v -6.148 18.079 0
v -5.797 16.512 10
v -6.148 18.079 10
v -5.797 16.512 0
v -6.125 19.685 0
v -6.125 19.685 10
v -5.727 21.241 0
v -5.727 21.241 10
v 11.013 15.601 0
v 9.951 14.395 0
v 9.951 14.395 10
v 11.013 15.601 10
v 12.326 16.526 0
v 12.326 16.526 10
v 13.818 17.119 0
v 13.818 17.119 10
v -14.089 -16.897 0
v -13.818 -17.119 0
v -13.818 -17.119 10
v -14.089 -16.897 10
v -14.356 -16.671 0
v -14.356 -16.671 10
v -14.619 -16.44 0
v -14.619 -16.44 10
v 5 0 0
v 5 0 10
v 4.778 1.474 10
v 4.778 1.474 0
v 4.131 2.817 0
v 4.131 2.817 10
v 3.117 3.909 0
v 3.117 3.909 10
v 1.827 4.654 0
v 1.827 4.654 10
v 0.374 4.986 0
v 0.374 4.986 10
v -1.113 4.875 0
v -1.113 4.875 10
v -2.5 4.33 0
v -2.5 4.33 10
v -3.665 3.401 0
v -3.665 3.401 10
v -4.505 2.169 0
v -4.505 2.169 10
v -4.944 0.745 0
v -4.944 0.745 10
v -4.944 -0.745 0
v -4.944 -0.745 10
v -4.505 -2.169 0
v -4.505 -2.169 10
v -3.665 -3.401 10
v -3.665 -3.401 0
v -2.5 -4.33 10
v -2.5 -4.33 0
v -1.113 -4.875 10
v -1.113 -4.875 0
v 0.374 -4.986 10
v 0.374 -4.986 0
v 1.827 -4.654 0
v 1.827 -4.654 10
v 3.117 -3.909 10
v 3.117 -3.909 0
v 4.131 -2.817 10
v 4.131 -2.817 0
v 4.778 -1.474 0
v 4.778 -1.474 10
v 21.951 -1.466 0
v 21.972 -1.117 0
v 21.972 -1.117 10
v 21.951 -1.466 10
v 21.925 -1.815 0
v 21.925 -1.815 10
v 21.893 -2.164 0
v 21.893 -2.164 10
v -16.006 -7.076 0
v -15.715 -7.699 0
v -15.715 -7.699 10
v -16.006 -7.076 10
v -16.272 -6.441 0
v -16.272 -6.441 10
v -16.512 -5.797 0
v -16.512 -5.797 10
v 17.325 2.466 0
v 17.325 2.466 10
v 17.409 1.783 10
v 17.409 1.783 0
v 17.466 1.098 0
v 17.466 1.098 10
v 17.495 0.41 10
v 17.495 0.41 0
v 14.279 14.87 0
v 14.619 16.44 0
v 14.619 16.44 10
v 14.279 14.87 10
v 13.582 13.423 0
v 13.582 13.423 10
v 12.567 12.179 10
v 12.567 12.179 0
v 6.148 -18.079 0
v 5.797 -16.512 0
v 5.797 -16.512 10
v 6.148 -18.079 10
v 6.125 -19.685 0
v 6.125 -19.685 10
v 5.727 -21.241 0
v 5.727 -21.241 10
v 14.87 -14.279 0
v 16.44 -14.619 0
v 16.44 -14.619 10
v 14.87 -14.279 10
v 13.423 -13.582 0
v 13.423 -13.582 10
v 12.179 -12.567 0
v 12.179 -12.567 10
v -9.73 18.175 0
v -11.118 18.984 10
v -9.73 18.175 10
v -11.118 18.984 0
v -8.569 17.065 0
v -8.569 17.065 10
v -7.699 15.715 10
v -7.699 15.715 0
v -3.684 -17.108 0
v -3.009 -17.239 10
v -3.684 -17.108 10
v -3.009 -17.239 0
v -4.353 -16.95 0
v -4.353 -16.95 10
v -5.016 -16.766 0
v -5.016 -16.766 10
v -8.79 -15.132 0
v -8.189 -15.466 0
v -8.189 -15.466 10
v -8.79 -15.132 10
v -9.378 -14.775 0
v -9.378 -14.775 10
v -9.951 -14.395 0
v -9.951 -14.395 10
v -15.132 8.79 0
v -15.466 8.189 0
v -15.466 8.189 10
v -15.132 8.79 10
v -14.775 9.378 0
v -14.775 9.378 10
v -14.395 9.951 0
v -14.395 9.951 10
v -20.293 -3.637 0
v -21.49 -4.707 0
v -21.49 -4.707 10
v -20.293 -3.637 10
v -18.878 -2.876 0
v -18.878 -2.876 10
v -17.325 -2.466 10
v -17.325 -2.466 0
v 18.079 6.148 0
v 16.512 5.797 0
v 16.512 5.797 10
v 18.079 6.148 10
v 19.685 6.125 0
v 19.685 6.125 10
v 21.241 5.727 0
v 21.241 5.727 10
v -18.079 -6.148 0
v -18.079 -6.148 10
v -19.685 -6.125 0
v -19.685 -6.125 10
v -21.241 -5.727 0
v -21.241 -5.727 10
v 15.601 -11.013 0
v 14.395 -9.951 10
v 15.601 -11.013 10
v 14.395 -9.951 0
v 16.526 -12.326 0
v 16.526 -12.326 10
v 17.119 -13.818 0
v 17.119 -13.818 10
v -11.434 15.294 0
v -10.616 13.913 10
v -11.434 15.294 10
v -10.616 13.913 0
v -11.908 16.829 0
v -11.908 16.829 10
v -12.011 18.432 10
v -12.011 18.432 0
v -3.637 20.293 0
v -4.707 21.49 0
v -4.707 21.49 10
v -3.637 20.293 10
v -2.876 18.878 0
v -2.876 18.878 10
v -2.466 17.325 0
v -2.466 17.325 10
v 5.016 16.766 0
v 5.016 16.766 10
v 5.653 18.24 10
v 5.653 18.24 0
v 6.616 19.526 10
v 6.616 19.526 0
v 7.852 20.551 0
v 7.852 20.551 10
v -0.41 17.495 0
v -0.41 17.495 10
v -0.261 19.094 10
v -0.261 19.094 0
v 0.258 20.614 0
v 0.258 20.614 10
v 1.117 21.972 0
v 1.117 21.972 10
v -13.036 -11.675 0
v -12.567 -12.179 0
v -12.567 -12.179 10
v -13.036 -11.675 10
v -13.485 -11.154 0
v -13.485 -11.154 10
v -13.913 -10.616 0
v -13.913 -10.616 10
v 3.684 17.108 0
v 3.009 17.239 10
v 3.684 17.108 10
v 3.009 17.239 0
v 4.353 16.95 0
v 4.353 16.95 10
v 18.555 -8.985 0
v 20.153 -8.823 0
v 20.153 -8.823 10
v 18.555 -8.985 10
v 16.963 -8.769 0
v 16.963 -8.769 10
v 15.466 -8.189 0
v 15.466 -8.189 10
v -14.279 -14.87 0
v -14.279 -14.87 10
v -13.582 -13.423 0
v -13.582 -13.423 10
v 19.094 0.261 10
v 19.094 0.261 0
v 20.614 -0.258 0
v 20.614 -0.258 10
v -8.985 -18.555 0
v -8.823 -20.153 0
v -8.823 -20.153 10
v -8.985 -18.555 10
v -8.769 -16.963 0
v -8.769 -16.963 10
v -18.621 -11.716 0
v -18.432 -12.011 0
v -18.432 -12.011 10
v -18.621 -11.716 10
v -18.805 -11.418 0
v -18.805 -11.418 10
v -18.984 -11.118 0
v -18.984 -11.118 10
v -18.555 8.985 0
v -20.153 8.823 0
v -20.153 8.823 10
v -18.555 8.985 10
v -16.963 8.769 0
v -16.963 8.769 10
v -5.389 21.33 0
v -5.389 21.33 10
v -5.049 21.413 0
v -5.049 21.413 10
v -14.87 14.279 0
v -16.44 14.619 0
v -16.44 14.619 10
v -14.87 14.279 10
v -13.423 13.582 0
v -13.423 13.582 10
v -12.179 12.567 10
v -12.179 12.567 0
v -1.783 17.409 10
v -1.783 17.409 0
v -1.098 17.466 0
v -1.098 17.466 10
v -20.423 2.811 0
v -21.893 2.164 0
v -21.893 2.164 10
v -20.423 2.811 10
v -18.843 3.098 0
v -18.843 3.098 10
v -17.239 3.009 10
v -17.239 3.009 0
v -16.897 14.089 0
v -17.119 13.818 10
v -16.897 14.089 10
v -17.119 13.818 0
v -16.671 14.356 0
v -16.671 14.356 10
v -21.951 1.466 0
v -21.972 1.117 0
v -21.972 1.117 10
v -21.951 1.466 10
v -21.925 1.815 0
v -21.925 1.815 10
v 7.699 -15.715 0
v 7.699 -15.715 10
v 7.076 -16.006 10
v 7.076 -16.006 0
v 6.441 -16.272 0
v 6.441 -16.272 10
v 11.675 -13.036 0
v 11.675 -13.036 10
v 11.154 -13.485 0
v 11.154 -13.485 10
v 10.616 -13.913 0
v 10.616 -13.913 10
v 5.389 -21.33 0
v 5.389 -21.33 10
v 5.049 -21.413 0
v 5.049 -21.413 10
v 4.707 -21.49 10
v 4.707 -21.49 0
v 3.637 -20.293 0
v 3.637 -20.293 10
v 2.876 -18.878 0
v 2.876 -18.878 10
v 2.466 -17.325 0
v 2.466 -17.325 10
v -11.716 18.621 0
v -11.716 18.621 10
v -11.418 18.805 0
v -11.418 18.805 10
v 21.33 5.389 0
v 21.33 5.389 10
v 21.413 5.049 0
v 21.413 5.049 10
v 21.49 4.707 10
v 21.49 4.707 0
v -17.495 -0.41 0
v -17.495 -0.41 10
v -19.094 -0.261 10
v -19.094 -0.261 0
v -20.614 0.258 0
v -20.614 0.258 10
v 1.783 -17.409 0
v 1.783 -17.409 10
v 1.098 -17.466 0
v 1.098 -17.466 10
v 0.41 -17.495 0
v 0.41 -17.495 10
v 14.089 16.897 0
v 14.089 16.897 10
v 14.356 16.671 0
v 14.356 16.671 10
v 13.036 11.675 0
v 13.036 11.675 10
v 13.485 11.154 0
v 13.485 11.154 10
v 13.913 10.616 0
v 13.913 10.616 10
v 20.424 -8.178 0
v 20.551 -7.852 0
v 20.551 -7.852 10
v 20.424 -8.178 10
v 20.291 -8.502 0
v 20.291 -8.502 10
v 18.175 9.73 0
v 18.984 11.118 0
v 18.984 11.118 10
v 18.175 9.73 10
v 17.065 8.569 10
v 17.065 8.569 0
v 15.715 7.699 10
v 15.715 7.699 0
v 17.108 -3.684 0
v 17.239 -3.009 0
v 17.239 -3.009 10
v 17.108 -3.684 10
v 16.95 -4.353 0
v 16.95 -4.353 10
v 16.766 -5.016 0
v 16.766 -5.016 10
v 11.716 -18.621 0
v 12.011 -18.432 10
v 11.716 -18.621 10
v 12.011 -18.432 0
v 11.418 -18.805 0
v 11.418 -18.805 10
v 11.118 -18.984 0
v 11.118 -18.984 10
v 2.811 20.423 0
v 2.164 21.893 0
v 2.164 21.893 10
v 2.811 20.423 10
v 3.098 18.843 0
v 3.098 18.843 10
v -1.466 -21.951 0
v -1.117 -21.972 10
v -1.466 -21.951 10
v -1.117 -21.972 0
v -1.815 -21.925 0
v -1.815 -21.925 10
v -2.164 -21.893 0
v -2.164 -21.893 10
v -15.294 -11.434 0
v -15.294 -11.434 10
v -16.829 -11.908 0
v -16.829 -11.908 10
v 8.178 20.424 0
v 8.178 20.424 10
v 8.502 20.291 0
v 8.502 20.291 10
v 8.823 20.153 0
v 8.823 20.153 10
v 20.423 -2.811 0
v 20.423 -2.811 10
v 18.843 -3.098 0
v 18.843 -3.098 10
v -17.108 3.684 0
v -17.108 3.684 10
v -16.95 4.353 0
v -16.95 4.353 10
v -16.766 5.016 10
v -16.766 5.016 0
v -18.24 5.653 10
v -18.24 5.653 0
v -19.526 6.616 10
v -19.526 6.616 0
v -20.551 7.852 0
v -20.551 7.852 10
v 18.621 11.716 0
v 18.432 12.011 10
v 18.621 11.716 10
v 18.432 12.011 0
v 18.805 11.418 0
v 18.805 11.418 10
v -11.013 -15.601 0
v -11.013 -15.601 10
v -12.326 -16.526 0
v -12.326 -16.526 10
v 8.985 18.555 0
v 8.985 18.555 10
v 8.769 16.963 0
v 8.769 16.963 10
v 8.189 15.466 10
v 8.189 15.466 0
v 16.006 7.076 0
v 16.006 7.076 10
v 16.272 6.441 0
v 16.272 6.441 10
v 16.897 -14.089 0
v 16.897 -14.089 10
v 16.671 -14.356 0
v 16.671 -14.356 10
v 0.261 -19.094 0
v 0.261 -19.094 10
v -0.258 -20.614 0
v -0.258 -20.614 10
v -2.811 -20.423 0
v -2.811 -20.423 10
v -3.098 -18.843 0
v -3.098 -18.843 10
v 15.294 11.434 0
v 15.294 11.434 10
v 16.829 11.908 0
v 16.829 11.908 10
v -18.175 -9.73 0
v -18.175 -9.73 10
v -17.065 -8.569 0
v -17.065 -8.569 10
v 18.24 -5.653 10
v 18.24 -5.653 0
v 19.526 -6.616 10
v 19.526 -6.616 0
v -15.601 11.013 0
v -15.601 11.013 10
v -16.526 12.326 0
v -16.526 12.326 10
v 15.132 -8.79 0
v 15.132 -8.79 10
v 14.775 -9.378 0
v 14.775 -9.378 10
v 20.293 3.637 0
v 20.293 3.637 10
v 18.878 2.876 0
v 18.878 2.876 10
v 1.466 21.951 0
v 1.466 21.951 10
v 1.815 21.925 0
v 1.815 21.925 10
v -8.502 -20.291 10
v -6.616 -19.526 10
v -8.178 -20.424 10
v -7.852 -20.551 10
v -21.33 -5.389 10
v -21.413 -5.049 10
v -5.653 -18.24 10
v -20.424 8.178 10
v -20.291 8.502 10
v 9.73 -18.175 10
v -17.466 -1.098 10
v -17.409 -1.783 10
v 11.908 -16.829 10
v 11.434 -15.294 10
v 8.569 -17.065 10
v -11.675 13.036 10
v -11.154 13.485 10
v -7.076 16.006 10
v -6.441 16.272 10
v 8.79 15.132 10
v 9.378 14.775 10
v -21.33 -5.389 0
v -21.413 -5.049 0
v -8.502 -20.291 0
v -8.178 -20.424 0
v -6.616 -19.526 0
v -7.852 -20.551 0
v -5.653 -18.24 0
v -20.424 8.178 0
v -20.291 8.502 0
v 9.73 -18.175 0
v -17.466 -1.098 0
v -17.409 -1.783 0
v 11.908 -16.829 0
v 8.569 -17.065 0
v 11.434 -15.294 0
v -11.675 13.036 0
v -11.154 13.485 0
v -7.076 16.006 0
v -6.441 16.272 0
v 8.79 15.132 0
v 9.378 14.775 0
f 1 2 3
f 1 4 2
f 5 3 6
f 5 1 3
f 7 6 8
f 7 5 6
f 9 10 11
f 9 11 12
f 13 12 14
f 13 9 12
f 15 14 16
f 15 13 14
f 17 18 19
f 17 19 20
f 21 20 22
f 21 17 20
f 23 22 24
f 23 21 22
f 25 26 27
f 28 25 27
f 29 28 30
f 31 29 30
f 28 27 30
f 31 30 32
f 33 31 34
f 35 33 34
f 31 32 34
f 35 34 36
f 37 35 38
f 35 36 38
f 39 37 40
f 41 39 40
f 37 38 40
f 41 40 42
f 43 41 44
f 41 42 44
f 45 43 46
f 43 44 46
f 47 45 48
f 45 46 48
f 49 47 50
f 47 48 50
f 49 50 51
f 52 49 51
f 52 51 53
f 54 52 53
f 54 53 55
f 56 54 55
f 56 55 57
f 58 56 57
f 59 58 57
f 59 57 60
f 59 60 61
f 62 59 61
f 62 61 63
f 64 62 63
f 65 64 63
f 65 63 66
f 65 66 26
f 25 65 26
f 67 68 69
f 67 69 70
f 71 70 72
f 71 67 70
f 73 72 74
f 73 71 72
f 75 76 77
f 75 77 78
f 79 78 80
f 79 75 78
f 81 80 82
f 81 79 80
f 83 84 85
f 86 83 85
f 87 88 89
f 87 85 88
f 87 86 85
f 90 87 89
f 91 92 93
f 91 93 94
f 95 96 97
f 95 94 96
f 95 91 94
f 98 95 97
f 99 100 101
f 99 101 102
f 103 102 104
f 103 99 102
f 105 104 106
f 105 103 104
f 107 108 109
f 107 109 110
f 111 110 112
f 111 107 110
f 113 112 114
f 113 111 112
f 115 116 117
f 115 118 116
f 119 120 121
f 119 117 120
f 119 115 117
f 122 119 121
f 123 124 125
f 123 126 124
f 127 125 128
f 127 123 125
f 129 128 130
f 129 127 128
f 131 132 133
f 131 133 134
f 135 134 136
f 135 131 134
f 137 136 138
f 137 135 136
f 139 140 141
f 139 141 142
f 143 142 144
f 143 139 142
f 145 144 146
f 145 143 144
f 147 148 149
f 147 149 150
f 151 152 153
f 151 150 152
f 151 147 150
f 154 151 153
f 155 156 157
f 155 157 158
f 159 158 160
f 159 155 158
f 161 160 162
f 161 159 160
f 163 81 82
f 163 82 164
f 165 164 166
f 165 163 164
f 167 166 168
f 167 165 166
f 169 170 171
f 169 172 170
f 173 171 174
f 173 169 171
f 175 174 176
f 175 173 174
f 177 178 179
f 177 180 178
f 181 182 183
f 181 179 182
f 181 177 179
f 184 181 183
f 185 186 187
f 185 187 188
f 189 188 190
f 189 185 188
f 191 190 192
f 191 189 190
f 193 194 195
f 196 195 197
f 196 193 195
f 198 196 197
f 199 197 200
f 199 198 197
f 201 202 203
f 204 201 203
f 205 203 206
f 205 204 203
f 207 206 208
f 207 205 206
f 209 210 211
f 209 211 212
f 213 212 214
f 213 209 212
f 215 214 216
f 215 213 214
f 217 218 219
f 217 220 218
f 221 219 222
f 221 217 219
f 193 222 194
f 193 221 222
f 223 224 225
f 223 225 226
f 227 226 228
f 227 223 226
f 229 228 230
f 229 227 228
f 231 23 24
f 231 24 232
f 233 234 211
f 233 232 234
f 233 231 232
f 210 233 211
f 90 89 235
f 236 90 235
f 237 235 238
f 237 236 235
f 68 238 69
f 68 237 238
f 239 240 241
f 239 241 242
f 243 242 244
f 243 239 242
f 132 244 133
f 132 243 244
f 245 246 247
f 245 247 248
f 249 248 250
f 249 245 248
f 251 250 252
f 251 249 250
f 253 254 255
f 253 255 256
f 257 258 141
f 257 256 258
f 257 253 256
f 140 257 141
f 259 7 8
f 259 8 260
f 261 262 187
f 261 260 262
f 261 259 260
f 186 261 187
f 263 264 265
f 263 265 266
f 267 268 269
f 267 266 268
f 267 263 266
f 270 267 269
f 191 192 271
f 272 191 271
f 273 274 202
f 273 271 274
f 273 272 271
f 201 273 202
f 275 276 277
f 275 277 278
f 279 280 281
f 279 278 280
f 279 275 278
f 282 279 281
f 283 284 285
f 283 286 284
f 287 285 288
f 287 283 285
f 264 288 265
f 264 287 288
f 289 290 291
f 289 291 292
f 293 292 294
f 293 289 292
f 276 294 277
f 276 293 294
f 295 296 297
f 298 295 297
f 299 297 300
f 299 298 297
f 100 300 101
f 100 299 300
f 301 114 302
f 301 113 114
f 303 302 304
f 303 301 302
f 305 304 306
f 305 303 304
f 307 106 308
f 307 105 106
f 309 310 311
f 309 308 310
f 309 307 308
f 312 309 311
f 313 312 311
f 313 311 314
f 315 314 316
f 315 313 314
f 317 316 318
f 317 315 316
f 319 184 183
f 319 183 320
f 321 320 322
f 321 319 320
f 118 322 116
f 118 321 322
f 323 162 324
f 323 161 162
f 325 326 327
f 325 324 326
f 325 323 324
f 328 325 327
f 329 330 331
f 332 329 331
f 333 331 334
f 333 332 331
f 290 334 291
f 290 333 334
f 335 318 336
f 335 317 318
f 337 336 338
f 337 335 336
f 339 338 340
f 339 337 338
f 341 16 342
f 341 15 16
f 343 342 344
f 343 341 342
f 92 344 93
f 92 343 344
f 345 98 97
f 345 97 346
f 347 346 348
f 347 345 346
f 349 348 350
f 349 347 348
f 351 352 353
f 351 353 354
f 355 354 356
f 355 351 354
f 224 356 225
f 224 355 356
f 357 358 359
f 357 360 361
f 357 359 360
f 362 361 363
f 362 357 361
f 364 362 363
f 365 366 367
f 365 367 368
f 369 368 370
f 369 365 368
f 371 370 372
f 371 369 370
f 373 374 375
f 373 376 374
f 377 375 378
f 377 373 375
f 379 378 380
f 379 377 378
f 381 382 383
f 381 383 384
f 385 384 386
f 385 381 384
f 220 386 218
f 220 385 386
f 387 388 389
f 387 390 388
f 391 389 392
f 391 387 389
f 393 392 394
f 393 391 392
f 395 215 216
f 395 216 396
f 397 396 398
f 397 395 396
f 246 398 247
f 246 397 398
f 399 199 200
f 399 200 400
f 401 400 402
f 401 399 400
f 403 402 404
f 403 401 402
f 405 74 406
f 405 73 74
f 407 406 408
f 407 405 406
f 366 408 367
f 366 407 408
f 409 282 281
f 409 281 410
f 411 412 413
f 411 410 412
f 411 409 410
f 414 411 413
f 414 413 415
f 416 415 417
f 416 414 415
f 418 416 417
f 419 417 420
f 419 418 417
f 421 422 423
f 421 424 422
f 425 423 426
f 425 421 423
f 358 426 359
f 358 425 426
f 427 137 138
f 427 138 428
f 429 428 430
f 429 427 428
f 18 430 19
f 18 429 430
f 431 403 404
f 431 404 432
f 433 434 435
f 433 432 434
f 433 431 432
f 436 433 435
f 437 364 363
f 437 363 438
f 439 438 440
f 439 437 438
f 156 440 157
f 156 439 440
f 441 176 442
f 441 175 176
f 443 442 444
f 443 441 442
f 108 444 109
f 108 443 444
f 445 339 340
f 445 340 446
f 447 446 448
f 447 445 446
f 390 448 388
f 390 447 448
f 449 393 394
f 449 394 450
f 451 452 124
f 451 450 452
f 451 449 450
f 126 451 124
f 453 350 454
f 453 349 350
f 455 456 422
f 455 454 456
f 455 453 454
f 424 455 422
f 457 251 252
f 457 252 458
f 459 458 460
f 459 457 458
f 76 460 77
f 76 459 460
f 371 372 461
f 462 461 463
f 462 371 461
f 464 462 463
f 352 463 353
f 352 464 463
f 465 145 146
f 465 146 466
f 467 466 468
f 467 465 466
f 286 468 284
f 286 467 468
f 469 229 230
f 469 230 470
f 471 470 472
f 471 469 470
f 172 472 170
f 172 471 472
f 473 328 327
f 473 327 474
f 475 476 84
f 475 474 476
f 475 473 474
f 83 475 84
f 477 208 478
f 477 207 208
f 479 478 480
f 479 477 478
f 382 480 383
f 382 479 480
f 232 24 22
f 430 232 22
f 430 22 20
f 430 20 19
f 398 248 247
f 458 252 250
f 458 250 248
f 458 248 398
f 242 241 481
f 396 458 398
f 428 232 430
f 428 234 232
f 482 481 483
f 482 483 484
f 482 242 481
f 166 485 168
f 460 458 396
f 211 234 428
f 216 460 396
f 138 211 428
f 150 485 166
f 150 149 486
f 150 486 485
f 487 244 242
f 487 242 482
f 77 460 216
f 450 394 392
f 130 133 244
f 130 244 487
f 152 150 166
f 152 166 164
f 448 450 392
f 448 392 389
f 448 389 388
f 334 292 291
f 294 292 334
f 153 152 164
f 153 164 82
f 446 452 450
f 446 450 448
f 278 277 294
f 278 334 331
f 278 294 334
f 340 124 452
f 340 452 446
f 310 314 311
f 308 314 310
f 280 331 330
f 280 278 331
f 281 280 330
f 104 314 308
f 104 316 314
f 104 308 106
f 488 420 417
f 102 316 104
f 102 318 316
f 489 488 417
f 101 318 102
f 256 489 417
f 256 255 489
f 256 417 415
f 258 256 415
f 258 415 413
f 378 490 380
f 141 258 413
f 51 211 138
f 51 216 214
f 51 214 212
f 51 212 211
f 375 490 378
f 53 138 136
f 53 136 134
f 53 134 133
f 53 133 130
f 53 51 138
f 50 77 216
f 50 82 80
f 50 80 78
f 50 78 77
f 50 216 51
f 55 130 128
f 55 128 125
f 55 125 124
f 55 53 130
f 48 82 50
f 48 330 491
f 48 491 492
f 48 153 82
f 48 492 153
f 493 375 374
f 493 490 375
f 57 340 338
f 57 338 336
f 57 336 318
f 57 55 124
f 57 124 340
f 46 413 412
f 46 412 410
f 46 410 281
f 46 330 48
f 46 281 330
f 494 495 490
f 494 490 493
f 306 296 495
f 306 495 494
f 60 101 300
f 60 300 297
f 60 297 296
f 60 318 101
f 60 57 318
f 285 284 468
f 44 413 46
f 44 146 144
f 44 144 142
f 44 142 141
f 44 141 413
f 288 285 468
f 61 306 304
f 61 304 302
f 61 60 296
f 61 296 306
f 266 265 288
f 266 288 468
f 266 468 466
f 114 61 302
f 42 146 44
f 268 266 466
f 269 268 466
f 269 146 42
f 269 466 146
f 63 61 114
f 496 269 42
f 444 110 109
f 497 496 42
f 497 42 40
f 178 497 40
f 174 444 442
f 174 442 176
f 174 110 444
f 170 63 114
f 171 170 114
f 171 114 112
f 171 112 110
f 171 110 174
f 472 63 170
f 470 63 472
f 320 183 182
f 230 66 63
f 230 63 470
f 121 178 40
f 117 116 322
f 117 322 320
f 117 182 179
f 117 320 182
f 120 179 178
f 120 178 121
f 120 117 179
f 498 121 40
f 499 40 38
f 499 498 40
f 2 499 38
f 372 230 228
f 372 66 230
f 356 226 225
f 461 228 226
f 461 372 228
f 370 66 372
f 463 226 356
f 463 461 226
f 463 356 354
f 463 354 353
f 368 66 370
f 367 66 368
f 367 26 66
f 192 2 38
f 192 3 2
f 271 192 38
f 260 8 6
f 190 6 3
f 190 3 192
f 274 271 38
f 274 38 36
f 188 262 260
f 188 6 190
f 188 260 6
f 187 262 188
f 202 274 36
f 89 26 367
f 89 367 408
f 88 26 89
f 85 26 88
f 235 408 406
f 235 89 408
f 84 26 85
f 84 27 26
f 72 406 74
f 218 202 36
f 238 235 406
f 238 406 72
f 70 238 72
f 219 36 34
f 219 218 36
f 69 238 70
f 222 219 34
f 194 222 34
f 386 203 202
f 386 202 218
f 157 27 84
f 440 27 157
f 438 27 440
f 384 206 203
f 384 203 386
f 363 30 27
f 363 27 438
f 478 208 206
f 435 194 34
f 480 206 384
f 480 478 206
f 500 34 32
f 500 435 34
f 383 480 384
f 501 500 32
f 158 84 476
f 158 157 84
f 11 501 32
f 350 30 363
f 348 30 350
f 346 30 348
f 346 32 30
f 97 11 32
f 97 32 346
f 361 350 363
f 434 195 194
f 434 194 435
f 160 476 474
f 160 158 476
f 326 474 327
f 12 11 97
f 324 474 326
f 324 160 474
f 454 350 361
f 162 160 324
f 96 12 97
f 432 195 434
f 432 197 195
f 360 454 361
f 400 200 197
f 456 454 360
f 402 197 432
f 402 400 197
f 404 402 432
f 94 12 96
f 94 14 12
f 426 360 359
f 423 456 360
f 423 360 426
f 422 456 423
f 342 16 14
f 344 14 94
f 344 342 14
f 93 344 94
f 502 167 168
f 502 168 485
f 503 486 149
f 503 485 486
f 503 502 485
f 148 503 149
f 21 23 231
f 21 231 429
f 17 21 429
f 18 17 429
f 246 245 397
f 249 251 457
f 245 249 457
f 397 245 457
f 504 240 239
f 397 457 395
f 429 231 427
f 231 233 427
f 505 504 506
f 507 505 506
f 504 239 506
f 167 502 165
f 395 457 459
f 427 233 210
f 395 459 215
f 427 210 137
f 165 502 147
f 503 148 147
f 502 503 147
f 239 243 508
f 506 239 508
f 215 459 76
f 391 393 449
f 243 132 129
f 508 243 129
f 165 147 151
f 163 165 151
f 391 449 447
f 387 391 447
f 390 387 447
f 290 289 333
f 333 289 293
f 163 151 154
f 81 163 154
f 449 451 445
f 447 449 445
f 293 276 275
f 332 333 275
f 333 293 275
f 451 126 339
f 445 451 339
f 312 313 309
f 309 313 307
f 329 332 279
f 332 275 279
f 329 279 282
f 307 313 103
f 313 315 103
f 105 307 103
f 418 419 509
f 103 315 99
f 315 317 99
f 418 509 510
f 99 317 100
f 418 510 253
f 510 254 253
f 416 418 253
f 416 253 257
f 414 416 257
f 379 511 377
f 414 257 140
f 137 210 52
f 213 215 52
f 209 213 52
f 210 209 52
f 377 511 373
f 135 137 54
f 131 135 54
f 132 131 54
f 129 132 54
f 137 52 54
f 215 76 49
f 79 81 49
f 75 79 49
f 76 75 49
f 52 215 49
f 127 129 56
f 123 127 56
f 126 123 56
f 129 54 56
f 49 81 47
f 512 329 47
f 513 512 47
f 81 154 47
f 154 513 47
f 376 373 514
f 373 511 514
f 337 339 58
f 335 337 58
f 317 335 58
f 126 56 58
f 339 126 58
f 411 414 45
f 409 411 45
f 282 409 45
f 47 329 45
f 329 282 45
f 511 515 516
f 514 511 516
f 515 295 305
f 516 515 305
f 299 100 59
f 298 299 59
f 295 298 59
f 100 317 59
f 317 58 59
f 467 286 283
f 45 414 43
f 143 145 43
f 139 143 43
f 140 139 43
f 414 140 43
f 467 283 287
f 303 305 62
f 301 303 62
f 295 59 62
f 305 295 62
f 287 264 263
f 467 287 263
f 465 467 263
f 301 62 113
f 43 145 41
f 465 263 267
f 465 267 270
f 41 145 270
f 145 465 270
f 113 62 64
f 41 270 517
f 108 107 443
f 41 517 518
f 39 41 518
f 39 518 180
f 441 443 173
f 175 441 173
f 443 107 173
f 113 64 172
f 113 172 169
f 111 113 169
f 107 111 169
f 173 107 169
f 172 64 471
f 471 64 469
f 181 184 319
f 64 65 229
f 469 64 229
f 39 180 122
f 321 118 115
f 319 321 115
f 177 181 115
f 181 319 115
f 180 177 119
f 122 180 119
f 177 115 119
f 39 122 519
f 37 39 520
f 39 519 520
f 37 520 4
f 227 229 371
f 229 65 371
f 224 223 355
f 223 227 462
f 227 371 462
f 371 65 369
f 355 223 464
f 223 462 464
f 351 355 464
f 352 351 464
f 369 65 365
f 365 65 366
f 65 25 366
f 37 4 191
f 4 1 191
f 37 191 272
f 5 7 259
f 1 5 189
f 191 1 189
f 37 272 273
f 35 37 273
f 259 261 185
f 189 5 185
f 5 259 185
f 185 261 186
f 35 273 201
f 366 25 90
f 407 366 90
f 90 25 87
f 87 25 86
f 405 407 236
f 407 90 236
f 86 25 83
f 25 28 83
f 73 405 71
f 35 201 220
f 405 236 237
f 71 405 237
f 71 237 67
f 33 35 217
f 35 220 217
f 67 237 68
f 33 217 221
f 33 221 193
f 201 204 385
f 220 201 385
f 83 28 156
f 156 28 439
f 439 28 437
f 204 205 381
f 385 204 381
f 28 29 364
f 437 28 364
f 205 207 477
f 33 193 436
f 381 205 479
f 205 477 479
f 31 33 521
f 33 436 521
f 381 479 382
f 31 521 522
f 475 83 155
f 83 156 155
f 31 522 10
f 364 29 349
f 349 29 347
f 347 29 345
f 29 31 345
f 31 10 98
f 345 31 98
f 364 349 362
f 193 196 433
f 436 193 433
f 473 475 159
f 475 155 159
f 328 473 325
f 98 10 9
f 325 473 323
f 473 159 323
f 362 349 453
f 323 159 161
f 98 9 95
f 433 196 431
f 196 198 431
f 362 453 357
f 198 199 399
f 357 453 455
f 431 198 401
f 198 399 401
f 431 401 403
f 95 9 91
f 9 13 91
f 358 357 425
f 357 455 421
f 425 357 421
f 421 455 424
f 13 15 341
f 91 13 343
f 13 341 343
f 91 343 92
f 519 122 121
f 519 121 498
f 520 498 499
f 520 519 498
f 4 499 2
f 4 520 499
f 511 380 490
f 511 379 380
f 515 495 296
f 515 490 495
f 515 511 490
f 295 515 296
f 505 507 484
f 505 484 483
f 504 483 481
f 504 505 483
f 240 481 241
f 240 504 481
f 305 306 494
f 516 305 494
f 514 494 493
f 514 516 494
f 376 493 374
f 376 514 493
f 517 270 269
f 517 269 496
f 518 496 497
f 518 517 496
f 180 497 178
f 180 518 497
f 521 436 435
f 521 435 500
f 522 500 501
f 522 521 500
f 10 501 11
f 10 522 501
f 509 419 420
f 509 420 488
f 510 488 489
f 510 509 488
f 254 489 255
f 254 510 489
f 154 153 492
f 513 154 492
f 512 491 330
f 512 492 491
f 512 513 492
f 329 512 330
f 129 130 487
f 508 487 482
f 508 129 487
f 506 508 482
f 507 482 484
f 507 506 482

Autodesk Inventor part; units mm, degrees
ref_plane "YZ Plane" through (0, 0, 0) normal (1, 0, 0) x (0, 1, 0)
ref_plane "XZ Plane" through (0, 0, 0) normal (0, 1, 0) x (-1, 0, 0)
ref_plane "XY Plane" through (0, 0, 0) normal (0, 0, 1) x (1, 0, 0)
sketch "Sketch1" plane through (0, 0, 0) normal (0, 0, 1) x (1, 0, 0)
  arc A0 (21.8933, -2.1639) -> (21.9716, -1.1171) centre (0, 0) ccw
  circle A1 centre (0, 0) radius 17.5
  line L0 (0, 0) -> (28.7195, 0) construction
  arc A2 (21.9716, -1.1171) -> (17.4952, 0.4105) centre (17.6604, -6.4279) ccw
  line L1 (0, 0) -> (30.5019, 0) construction
  arc A3 (17.2394, -3.0086) -> (21.8933, -2.1639) centre (18.4202, 3.7291) ccw
  arc A4 (21.4905, 4.7074) -> (21.2414, 5.7272) centre (0, 0) ccw
  arc A5 (21.2414, 5.7272) -> (16.512, 5.7967) centre (18.7824, -0.6559) ccw
  arc A6 (17.3254, 2.4659) -> (21.4905, 4.7074) centre (16.3662, 9.2388) ccw
  arc A7 (18.984, 11.1179) -> (18.432, 12.0109) centre (0, 0) ccw
  arc A8 (18.432, 12.0109) -> (13.9126, 10.6155) centre (18.0658, 5.1803) ccw
  arc A9 (15.7154, 7.6991) -> (18.984, 11.1179) centre (12.7103, 13.844) ccw
  arc A10 (14.6192, 16.4401) -> (13.8183, 17.1188) centre (0, 0) ccw
  arc A11 (13.8183, 17.1188) -> (9.9513, 14.3952) centre (15.5808, 10.5094) ccw
  arc A12 (12.5671, 12.1786) -> (14.6192, 16.4401) centre (7.8102, 17.0942) ccw
  arc A13 (8.8234, 20.1531) -> (7.852, 20.5511) centre (0, 0) ccw
  arc A14 (7.852, 20.5511) -> (5.0159, 16.7658) centre (11.5707, 14.8098) ccw
  arc A15 (8.1886, 15.466) -> (8.8234, 20.1531) centre (2.1455, 18.671) ccw
  arc A16 (2.1639, 21.8933) -> (1.1171, 21.9716) centre (0, 0) ccw
  arc A17 (1.1171, 21.9716) -> (-0.4105, 17.4952) centre (6.4279, 17.6604) ccw
  arc A18 (3.0086, 17.2394) -> (2.1639, 21.8933) centre (-3.7291, 18.4202) ccw
  arc A19 (-4.7074, 21.4905) -> (-5.7272, 21.2414) centre (0, 0) ccw
  arc A20 (-5.7272, 21.2414) -> (-5.7967, 16.512) centre (0.6559, 18.7824) ccw
  arc A21 (-2.4659, 17.3254) -> (-4.7074, 21.4905) centre (-9.2388, 16.3662) ccw
  arc A22 (-11.1179, 18.984) -> (-12.0109, 18.432) centre (0, 0) ccw
  arc A23 (-12.0109, 18.432) -> (-10.6155, 13.9126) centre (-5.1803, 18.0658) ccw
  arc A24 (-7.6991, 15.7154) -> (-11.1179, 18.984) centre (-13.844, 12.7103) ccw
  arc A25 (-16.4401, 14.6192) -> (-17.1188, 13.8183) centre (0, 0) ccw
  arc A26 (-17.1188, 13.8183) -> (-14.3952, 9.9513) centre (-10.5094, 15.5808) ccw
  arc A27 (-12.1786, 12.5671) -> (-16.4401, 14.6192) centre (-17.0942, 7.8102) ccw
  arc A28 (-20.1531, 8.8234) -> (-20.5511, 7.852) centre (0, 0) ccw
  arc A29 (-20.5511, 7.852) -> (-16.7658, 5.0159) centre (-14.8098, 11.5707) ccw
  arc A30 (-15.466, 8.1886) -> (-20.1531, 8.8234) centre (-18.671, 2.1455) ccw
  arc A31 (-21.8933, 2.1639) -> (-21.9716, 1.1171) centre (0, 0) ccw
  arc A32 (-21.9716, 1.1171) -> (-17.4952, -0.4105) centre (-17.6604, 6.4279) ccw
  arc A33 (-17.2394, 3.0086) -> (-21.8933, 2.1639) centre (-18.4202, -3.7291) ccw
  arc A34 (-21.4905, -4.7074) -> (-21.2414, -5.7272) centre (0, 0) ccw
  arc A35 (-21.2414, -5.7272) -> (-16.512, -5.7967) centre (-18.7824, 0.6559) ccw
  arc A36 (-17.3254, -2.4659) -> (-21.4905, -4.7074) centre (-16.3662, -9.2388) ccw
  arc A37 (-18.984, -11.1179) -> (-18.432, -12.0109) centre (0, 0) ccw
  arc A38 (-18.432, -12.0109) -> (-13.9126, -10.6155) centre (-18.0658, -5.1803) ccw
  arc A39 (-15.7154, -7.6991) -> (-18.984, -11.1179) centre (-12.7103, -13.844) ccw
  arc A40 (-14.6192, -16.4401) -> (-13.8183, -17.1188) centre (0, 0) ccw
  arc A41 (-13.8183, -17.1188) -> (-9.9513, -14.3952) centre (-15.5808, -10.5094) ccw
  arc A42 (-12.5671, -12.1786) -> (-14.6192, -16.4401) centre (-7.8102, -17.0942) ccw
  arc A43 (-8.8234, -20.1531) -> (-7.852, -20.5511) centre (0, 0) ccw
  arc A44 (-7.852, -20.5511) -> (-5.0159, -16.7658) centre (-11.5707, -14.8098) ccw
  arc A45 (-8.1886, -15.466) -> (-8.8234, -20.1531) centre (-2.1455, -18.671) ccw
  arc A46 (-2.1639, -21.8933) -> (-1.1171, -21.9716) centre (0, 0) ccw
  arc A47 (-1.1171, -21.9716) -> (0.4105, -17.4952) centre (-6.4279, -17.6604) ccw
  arc A48 (-3.0086, -17.2394) -> (-2.1639, -21.8933) centre (3.7291, -18.4202) ccw
  arc A49 (4.7074, -21.4905) -> (5.7272, -21.2414) centre (0, 0) ccw
  arc A50 (5.7272, -21.2414) -> (5.7967, -16.512) centre (-0.6559, -18.7824) ccw
  arc A51 (2.4659, -17.3254) -> (4.7074, -21.4905) centre (9.2388, -16.3662) ccw
  arc A52 (11.1179, -18.984) -> (12.0109, -18.432) centre (0, 0) ccw
  arc A53 (12.0109, -18.432) -> (10.6155, -13.9126) centre (5.1803, -18.0658) ccw
  arc A54 (7.6991, -15.7154) -> (11.1179, -18.984) centre (13.844, -12.7103) ccw
  arc A55 (16.4401, -14.6192) -> (17.1188, -13.8183) centre (0, 0) ccw
  arc A56 (17.1188, -13.8183) -> (14.3952, -9.9513) centre (10.5094, -15.5808) ccw
  arc A57 (12.1786, -12.5671) -> (16.4401, -14.6192) centre (17.0942, -7.8102) ccw
  arc A58 (20.1531, -8.8234) -> (20.5511, -7.852) centre (0, 0) ccw
  arc A59 (20.5511, -7.852) -> (16.7658, -5.0159) centre (14.8098, -11.5707) ccw
  arc A60 (15.466, -8.1886) -> (20.1531, -8.8234) centre (18.671, -2.1455) ccw
  point P0 (16.7658, -5.0159)
  point P1 (17.2394, -3.0086)
  point P2 (17.3254, 2.4659)
  point P3 (16.512, 5.7967)
  point P4 (13.9126, 10.6155)
  point P5 (12.5671, 12.1786)
  point P6 (9.9513, 14.3952)
  point P7 (5.0159, 16.7658)
  point P8 (3.0086, 17.2394)
  point P9 (-0.4105, 17.4952)
  point P10 (-2.4659, 17.3254)
  point P11 (-5.7967, 16.512)
  point P12 (-10.6155, 13.9126)
  point P13 (-12.1786, 12.5671)
  point P14 (-14.3952, 9.9513)
  point P15 (-16.7658, 5.0159)
  point P16 (-17.2394, 3.0086)
  point P17 (-17.4952, -0.4105)
  point P18 (-17.3254, -2.4659)
  point P19 (-16.512, -5.7967)
  point P20 (-13.9126, -10.6155)
  point P21 (-12.5671, -12.1786)
  point P22 (-9.9513, -14.3952)
  point P23 (-8.1886, -15.466)
  point P24 (-3.0086, -17.2394)
  point P25 (0.4105, -17.4952)
  point P26 (2.4659, -17.3254)
  point P27 (5.7967, -16.512)
  point P28 (10.6155, -13.9126)
  point P29 (12.1786, -12.5671)
  point P30 (15.466, -8.1886)
  dimension "d13" = 35
  dimension "d12" = 44
  dimension "d18" = 360
extrude "Extrusion1" add sketch "Sketch1" along normal blind 10
sketch "Sketch2" plane through (0, 0, 10) normal (0, 0, 1) x (1, 0, 0)
  circle A0 centre (0, 0) radius 5
  dimension "d20" = 10
extrude "Extrusion2" cut sketch "Sketch2" against normal blind 10
properties part number "ENGRANAJE PARA RODILLO"
